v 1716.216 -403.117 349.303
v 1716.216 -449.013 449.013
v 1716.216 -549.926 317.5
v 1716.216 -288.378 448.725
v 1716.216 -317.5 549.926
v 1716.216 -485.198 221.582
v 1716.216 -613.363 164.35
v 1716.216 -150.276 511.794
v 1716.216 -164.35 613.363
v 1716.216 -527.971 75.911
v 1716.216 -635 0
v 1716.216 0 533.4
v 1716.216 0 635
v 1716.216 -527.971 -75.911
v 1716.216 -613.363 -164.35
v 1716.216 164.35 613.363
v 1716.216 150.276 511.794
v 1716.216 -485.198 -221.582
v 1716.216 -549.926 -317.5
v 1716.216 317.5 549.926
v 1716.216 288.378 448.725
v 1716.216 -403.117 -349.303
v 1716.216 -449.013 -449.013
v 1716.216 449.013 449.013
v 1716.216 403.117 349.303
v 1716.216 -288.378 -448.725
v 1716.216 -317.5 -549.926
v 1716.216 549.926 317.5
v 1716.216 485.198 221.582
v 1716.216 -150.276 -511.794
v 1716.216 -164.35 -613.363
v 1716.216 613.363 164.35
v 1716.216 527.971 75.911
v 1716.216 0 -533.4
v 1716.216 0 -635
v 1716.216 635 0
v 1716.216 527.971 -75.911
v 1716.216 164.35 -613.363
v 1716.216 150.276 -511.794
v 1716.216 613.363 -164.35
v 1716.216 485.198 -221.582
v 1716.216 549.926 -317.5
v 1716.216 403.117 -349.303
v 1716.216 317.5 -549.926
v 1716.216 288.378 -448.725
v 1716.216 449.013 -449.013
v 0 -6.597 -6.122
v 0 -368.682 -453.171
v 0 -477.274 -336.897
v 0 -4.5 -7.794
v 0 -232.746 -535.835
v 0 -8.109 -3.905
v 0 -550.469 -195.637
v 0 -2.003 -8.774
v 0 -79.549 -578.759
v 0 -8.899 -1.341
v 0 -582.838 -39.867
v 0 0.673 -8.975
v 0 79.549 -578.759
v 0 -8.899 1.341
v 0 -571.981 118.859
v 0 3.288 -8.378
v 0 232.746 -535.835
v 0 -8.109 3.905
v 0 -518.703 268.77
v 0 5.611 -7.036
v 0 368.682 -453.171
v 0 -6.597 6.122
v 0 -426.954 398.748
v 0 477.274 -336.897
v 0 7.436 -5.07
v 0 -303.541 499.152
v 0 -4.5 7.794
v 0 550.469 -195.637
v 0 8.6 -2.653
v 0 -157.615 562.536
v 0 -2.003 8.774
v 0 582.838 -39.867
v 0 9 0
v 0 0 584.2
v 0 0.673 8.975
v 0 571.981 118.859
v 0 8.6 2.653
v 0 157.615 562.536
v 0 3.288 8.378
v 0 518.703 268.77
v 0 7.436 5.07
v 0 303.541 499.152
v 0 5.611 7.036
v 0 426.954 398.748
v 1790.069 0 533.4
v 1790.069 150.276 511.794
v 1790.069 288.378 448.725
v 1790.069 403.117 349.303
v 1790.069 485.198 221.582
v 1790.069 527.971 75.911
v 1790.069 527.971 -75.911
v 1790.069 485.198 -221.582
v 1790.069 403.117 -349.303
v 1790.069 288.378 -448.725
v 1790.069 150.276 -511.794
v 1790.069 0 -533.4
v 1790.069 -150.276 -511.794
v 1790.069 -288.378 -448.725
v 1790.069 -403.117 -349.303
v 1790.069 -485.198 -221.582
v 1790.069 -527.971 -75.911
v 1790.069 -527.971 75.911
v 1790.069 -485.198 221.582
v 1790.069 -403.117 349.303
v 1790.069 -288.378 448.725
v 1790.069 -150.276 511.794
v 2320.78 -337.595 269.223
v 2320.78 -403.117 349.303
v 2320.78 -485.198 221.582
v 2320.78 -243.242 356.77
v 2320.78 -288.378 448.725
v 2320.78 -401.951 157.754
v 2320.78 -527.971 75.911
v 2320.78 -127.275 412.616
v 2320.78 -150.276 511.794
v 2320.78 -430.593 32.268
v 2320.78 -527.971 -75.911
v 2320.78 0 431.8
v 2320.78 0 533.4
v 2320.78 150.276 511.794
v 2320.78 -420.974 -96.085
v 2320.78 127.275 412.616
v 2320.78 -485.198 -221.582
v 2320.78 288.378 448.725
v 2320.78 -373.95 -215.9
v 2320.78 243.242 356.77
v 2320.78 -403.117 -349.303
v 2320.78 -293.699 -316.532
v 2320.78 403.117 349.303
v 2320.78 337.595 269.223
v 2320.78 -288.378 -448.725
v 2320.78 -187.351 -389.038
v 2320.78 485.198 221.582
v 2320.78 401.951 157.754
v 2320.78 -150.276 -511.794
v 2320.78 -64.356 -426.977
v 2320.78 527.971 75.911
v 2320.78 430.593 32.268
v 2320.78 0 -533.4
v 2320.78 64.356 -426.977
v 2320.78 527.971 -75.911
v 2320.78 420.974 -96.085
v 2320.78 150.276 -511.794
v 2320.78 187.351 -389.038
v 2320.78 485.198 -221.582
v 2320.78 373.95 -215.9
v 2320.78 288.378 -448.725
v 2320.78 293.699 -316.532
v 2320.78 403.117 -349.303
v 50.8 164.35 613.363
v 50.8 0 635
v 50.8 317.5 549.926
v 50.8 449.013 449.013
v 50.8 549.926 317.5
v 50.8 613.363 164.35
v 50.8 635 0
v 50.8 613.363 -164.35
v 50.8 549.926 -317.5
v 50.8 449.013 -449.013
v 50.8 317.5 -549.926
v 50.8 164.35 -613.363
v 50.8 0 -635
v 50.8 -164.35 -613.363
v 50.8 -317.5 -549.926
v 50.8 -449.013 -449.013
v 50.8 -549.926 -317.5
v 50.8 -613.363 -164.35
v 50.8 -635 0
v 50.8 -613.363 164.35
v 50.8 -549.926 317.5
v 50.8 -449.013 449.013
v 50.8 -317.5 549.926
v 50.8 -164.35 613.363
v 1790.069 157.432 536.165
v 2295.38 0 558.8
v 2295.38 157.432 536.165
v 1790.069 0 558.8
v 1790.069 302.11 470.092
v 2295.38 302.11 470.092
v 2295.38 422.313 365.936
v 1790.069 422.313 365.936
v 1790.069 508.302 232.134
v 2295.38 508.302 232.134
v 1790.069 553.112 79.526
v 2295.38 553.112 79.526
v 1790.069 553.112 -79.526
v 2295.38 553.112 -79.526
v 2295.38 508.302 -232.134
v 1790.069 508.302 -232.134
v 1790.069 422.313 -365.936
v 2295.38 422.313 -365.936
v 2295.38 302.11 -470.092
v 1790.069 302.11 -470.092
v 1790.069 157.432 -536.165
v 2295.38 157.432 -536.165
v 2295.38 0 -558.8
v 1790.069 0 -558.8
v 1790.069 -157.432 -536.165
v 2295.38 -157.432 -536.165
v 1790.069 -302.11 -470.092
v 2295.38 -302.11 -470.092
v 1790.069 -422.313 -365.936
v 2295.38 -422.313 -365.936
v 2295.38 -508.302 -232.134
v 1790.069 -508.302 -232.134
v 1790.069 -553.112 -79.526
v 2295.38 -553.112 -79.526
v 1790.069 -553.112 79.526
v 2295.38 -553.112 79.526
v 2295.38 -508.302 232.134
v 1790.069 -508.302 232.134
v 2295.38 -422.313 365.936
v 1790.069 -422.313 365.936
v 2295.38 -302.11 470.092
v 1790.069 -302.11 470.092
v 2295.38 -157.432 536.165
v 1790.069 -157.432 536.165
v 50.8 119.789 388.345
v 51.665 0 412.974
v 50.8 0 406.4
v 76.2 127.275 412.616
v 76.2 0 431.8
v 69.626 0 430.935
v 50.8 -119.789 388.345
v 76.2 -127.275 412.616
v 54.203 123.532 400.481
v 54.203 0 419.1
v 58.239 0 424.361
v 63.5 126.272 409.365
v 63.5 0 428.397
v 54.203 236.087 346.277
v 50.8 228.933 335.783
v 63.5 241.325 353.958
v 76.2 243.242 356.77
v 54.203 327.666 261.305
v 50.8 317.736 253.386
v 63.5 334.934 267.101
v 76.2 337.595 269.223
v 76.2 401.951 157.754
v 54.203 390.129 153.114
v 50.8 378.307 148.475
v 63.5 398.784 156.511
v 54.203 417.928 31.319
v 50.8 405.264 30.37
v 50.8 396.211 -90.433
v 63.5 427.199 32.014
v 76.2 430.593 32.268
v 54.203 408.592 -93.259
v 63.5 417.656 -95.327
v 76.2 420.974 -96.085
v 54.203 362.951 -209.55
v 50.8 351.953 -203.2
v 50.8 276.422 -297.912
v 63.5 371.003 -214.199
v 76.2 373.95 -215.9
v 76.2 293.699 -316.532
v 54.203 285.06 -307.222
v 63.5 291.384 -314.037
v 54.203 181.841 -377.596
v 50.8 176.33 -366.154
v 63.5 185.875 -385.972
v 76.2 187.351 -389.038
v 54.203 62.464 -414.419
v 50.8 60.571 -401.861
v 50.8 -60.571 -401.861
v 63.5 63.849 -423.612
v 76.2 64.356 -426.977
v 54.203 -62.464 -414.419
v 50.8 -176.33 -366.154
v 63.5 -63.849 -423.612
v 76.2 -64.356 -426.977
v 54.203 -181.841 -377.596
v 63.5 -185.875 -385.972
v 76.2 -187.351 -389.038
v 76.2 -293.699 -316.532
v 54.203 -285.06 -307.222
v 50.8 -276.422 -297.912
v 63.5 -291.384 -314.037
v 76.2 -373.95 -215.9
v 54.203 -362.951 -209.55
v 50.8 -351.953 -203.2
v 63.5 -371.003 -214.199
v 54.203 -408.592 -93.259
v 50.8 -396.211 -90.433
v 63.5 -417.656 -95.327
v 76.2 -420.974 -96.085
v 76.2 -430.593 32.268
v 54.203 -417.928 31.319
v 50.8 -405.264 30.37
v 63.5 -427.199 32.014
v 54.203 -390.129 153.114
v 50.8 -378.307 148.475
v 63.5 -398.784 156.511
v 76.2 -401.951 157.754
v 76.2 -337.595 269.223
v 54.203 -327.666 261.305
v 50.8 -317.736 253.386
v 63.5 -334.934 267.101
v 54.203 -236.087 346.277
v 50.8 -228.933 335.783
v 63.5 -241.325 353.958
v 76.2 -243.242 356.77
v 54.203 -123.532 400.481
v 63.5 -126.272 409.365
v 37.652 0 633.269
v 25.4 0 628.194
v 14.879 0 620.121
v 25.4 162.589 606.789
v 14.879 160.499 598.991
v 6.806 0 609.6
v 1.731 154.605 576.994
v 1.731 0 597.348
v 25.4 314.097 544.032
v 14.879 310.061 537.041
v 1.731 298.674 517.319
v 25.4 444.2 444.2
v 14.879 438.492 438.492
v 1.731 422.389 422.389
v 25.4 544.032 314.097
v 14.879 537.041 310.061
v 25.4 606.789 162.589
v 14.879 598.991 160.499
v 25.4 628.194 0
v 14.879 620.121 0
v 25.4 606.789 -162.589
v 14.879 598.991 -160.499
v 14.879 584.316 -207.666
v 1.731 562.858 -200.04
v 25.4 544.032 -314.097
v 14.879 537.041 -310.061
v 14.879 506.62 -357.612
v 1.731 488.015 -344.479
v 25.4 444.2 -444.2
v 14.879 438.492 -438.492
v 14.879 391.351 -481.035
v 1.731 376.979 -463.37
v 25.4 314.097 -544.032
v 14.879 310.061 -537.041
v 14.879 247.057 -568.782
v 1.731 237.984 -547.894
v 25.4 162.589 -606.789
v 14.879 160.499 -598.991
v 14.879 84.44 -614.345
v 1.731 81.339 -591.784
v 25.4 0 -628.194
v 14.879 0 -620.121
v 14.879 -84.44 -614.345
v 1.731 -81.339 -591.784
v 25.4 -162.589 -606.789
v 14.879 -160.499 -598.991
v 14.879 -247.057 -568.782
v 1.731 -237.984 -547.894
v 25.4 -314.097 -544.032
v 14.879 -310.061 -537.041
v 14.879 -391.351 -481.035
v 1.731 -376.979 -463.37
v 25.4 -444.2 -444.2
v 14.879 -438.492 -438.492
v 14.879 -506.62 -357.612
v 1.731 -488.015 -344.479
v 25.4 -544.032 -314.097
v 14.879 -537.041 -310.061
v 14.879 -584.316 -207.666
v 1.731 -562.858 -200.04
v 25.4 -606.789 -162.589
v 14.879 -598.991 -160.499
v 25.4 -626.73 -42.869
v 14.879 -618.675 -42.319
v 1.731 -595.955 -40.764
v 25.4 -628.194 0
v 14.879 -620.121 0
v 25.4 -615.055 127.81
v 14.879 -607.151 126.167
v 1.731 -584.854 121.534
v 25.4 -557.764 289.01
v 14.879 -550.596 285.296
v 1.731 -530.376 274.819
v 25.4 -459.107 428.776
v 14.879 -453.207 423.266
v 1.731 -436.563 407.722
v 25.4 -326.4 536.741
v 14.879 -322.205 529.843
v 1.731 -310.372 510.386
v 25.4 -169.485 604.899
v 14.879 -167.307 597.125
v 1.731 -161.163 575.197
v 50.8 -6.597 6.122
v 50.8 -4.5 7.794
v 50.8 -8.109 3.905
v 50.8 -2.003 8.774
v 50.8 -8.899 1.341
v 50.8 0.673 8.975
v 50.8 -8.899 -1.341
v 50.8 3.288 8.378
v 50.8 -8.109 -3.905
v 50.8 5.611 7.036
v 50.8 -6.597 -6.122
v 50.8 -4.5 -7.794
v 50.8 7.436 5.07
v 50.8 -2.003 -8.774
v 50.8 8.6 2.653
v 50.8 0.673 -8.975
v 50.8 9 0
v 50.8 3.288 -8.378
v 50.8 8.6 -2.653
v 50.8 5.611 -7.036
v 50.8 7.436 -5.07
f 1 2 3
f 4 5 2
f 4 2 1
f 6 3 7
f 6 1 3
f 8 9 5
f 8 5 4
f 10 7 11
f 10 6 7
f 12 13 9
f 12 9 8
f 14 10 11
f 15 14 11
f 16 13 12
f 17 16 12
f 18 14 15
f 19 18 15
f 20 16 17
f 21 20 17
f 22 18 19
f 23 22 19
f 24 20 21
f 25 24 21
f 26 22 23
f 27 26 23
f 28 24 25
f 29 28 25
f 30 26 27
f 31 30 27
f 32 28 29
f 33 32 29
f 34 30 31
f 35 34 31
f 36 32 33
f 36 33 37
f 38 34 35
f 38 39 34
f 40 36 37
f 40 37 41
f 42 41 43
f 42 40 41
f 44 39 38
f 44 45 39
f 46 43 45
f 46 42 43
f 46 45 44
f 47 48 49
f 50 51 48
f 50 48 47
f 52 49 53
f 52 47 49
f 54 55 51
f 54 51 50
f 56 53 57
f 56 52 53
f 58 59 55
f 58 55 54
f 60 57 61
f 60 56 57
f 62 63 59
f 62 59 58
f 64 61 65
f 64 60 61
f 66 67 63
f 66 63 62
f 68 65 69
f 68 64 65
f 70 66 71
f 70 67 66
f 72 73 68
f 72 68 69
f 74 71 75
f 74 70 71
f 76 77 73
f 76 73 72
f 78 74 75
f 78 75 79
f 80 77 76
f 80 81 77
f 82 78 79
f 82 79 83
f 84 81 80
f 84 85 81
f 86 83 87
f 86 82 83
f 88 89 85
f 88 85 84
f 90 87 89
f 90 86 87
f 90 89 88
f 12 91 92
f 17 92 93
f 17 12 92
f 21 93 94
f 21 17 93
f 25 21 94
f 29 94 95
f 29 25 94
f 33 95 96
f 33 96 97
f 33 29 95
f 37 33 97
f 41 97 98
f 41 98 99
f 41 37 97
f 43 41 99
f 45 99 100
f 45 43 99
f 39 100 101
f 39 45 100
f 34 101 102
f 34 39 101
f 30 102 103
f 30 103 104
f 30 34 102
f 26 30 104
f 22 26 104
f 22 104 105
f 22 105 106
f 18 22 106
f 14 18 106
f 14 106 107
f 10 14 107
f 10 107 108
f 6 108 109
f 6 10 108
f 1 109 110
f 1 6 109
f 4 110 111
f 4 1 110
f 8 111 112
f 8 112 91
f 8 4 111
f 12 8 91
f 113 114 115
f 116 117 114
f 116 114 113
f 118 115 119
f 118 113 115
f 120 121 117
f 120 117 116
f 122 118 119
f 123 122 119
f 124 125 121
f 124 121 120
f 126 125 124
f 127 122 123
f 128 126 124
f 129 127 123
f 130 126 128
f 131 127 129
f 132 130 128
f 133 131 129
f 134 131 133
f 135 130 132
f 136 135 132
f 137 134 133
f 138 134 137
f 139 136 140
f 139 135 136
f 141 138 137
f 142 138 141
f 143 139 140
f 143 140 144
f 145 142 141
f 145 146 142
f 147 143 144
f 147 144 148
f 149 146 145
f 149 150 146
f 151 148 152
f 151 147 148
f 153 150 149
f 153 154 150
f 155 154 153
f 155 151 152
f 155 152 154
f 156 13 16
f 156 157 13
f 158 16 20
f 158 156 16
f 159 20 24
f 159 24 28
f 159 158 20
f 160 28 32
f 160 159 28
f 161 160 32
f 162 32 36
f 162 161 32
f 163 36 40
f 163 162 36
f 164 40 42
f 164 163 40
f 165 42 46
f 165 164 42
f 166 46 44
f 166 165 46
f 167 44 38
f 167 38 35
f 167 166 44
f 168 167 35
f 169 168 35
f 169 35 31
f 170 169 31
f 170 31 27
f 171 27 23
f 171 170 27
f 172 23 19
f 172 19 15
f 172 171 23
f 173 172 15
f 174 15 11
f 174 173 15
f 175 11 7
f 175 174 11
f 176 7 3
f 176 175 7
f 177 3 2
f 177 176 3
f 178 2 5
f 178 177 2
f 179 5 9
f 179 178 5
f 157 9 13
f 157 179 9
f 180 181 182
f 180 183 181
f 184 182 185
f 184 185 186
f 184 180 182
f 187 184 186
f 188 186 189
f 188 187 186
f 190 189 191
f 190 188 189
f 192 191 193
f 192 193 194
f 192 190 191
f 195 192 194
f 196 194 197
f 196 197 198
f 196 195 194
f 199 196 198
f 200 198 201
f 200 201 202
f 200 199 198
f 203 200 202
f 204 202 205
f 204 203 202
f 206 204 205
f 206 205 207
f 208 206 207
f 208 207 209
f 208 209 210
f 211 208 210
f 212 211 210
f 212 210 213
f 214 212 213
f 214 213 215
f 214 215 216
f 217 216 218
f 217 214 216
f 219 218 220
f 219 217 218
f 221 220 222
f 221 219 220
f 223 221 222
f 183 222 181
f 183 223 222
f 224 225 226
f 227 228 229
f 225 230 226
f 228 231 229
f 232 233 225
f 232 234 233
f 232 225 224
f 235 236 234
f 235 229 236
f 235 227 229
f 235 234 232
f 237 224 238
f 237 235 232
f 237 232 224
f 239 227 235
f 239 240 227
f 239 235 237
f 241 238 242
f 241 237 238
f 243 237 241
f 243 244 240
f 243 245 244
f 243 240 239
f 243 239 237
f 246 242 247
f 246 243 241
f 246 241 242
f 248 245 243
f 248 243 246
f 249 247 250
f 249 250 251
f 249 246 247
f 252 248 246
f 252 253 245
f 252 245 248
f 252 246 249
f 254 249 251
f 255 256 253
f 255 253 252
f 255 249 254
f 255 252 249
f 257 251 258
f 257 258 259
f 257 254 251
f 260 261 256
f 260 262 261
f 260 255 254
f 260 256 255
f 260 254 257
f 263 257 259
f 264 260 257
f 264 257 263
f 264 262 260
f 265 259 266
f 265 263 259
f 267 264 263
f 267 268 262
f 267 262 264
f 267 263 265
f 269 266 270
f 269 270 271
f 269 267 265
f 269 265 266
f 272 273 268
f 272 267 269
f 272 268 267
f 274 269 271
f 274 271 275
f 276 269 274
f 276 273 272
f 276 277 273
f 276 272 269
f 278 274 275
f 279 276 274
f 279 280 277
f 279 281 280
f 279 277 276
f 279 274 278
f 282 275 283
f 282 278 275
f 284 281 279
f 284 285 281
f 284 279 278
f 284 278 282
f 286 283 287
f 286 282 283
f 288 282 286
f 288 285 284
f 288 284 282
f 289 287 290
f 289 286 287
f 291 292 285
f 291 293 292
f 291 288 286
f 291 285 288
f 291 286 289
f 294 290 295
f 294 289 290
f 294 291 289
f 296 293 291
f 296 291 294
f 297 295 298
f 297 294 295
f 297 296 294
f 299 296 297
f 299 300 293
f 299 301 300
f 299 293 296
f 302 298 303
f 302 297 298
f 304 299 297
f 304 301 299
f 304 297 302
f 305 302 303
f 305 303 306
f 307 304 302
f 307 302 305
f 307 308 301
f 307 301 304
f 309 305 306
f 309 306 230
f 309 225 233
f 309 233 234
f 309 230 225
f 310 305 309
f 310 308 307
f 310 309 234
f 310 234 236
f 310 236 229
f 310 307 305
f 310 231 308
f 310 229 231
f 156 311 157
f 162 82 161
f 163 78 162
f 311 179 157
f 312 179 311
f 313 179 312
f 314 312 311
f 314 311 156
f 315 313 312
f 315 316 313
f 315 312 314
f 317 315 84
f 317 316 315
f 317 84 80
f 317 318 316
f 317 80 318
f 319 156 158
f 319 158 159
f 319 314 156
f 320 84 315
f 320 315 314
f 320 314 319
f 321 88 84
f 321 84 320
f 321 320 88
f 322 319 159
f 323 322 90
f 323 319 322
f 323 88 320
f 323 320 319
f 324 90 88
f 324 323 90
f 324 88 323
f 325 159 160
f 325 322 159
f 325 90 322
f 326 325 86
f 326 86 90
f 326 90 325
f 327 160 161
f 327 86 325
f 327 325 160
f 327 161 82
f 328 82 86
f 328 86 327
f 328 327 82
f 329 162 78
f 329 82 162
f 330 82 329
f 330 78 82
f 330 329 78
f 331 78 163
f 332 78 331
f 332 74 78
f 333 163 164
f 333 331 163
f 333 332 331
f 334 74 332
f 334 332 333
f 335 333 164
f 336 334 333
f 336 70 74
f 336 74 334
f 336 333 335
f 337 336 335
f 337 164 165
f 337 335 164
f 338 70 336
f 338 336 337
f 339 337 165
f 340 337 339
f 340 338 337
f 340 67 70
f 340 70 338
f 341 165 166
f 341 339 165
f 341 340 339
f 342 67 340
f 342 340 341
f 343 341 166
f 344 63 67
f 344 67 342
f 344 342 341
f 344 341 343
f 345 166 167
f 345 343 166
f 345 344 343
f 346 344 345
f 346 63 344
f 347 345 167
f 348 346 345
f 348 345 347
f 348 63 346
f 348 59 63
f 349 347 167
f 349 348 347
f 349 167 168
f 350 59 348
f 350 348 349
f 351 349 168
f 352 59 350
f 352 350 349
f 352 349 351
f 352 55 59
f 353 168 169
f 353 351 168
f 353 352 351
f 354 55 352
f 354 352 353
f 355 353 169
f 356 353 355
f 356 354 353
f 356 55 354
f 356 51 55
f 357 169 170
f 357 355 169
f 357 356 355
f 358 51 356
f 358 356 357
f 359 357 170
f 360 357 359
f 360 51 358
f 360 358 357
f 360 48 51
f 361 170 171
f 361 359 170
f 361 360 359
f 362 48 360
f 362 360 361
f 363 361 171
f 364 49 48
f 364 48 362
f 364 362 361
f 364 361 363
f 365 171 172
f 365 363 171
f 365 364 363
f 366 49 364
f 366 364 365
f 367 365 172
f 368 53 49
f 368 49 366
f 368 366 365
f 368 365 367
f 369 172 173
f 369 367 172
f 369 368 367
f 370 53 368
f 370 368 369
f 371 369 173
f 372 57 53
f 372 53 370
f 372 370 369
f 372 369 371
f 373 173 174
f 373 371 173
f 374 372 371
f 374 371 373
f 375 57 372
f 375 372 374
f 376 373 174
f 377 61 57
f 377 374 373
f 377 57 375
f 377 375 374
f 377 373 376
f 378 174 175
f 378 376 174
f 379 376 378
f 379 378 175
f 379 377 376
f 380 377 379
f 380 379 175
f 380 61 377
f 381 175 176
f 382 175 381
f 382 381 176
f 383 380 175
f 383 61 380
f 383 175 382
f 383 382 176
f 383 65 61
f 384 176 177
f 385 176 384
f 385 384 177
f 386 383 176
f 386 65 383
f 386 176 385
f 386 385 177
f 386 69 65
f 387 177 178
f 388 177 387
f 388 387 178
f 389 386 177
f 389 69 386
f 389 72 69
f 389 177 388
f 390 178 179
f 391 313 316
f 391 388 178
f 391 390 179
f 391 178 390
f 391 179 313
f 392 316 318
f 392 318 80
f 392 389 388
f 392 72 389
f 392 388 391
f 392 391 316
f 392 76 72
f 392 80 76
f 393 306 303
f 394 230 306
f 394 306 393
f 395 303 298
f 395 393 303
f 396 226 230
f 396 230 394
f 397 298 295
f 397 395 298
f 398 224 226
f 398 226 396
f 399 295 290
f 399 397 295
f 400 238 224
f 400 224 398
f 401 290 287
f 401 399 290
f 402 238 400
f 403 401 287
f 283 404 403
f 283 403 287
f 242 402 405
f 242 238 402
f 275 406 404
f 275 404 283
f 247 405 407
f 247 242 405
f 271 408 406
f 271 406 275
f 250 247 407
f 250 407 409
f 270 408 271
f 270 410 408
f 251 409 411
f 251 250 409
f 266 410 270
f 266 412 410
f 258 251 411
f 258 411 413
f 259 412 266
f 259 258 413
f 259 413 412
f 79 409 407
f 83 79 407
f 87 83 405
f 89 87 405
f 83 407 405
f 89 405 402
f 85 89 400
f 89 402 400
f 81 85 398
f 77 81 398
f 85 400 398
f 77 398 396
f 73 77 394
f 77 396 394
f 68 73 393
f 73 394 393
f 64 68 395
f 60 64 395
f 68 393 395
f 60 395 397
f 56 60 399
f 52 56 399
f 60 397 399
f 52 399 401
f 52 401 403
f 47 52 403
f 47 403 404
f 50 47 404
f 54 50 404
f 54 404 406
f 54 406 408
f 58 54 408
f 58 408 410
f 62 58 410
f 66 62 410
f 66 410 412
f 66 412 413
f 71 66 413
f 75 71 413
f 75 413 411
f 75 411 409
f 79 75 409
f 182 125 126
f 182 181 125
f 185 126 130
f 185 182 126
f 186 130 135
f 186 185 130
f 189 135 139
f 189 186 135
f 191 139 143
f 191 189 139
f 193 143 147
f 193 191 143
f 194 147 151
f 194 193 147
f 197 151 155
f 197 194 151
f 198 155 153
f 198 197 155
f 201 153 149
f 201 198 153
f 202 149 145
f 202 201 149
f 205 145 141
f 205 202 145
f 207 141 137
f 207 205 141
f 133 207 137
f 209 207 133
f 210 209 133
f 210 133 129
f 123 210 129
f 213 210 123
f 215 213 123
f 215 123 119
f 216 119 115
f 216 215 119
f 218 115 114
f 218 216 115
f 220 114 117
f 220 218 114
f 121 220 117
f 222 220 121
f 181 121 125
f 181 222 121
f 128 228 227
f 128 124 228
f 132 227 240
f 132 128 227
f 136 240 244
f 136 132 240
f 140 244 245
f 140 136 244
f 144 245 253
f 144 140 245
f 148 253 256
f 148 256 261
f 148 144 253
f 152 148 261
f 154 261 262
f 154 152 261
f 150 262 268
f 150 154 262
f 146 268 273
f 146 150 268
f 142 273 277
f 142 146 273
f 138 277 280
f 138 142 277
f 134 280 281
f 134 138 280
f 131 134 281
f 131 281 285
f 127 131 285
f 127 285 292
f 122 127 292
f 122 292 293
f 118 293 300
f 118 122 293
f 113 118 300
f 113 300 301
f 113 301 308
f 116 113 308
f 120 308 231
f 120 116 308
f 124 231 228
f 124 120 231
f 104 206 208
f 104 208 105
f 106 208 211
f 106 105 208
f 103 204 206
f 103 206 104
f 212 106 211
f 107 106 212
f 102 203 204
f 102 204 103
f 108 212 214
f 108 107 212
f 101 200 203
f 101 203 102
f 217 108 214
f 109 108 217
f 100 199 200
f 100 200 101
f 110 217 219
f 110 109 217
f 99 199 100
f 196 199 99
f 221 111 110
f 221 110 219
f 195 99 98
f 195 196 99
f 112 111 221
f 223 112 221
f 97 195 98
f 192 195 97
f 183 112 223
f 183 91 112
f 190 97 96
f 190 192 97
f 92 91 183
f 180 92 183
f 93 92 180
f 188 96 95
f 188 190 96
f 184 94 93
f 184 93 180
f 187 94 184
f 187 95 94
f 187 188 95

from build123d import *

# Parameters (mm, degrees)
F3_D = 18


with BuildPart() as f1:
    # F0 (on Front) → F1 (revolve)
    with BuildSketch(Plane.XZ):
        with BuildLine():
            Line((0, 584.2), (0, 0))
            Line((0, 0), (50.8, 0))
            Line((50.8, 0), (50.8, 406.4))
            ThreePointArc((50.8, 406.4), (58.2394877579, 424.3605122421), (76.2, 431.8))
            Line((76.2, 431.8), (1618.646797334, 431.8))
            Line((1618.646797334, 431.8), (2320.7796175957, 431.8))
            Line((2320.7796175957, 431.8), (2320.7796175957, 533.4))
            Line((2320.7796175957, 533.4), (2295.3796175957, 558.8))
            Line((2295.3796175957, 558.8), (1790.0687900748, 558.8))
            Line((1790.0687900748, 558.8), (1790.0687900748, 533.4))
            Line((1790.0687900748, 533.4), (1716.2160762749, 533.4))
            Line((1716.2160762749, 533.4), (1716.2160762749, 635))
            Line((1716.2160762749, 635), (50.8, 635))
            ThreePointArc((50.8, 635), (14.8789755157, 620.1210244843), (0, 584.2))
        make_face()
    revolve(axis=Axis((25.4, 0, 0), (-1, 0, 0)))

    # F3 (through all)
    with Locations(Plane(origin=(0, 0, 0), x_dir=(0, -1, 0), z_dir=(-1, 0, 0))):
        with Locations((0, 0)):
            Hole(F3_D / 2)


solid = f1.part
